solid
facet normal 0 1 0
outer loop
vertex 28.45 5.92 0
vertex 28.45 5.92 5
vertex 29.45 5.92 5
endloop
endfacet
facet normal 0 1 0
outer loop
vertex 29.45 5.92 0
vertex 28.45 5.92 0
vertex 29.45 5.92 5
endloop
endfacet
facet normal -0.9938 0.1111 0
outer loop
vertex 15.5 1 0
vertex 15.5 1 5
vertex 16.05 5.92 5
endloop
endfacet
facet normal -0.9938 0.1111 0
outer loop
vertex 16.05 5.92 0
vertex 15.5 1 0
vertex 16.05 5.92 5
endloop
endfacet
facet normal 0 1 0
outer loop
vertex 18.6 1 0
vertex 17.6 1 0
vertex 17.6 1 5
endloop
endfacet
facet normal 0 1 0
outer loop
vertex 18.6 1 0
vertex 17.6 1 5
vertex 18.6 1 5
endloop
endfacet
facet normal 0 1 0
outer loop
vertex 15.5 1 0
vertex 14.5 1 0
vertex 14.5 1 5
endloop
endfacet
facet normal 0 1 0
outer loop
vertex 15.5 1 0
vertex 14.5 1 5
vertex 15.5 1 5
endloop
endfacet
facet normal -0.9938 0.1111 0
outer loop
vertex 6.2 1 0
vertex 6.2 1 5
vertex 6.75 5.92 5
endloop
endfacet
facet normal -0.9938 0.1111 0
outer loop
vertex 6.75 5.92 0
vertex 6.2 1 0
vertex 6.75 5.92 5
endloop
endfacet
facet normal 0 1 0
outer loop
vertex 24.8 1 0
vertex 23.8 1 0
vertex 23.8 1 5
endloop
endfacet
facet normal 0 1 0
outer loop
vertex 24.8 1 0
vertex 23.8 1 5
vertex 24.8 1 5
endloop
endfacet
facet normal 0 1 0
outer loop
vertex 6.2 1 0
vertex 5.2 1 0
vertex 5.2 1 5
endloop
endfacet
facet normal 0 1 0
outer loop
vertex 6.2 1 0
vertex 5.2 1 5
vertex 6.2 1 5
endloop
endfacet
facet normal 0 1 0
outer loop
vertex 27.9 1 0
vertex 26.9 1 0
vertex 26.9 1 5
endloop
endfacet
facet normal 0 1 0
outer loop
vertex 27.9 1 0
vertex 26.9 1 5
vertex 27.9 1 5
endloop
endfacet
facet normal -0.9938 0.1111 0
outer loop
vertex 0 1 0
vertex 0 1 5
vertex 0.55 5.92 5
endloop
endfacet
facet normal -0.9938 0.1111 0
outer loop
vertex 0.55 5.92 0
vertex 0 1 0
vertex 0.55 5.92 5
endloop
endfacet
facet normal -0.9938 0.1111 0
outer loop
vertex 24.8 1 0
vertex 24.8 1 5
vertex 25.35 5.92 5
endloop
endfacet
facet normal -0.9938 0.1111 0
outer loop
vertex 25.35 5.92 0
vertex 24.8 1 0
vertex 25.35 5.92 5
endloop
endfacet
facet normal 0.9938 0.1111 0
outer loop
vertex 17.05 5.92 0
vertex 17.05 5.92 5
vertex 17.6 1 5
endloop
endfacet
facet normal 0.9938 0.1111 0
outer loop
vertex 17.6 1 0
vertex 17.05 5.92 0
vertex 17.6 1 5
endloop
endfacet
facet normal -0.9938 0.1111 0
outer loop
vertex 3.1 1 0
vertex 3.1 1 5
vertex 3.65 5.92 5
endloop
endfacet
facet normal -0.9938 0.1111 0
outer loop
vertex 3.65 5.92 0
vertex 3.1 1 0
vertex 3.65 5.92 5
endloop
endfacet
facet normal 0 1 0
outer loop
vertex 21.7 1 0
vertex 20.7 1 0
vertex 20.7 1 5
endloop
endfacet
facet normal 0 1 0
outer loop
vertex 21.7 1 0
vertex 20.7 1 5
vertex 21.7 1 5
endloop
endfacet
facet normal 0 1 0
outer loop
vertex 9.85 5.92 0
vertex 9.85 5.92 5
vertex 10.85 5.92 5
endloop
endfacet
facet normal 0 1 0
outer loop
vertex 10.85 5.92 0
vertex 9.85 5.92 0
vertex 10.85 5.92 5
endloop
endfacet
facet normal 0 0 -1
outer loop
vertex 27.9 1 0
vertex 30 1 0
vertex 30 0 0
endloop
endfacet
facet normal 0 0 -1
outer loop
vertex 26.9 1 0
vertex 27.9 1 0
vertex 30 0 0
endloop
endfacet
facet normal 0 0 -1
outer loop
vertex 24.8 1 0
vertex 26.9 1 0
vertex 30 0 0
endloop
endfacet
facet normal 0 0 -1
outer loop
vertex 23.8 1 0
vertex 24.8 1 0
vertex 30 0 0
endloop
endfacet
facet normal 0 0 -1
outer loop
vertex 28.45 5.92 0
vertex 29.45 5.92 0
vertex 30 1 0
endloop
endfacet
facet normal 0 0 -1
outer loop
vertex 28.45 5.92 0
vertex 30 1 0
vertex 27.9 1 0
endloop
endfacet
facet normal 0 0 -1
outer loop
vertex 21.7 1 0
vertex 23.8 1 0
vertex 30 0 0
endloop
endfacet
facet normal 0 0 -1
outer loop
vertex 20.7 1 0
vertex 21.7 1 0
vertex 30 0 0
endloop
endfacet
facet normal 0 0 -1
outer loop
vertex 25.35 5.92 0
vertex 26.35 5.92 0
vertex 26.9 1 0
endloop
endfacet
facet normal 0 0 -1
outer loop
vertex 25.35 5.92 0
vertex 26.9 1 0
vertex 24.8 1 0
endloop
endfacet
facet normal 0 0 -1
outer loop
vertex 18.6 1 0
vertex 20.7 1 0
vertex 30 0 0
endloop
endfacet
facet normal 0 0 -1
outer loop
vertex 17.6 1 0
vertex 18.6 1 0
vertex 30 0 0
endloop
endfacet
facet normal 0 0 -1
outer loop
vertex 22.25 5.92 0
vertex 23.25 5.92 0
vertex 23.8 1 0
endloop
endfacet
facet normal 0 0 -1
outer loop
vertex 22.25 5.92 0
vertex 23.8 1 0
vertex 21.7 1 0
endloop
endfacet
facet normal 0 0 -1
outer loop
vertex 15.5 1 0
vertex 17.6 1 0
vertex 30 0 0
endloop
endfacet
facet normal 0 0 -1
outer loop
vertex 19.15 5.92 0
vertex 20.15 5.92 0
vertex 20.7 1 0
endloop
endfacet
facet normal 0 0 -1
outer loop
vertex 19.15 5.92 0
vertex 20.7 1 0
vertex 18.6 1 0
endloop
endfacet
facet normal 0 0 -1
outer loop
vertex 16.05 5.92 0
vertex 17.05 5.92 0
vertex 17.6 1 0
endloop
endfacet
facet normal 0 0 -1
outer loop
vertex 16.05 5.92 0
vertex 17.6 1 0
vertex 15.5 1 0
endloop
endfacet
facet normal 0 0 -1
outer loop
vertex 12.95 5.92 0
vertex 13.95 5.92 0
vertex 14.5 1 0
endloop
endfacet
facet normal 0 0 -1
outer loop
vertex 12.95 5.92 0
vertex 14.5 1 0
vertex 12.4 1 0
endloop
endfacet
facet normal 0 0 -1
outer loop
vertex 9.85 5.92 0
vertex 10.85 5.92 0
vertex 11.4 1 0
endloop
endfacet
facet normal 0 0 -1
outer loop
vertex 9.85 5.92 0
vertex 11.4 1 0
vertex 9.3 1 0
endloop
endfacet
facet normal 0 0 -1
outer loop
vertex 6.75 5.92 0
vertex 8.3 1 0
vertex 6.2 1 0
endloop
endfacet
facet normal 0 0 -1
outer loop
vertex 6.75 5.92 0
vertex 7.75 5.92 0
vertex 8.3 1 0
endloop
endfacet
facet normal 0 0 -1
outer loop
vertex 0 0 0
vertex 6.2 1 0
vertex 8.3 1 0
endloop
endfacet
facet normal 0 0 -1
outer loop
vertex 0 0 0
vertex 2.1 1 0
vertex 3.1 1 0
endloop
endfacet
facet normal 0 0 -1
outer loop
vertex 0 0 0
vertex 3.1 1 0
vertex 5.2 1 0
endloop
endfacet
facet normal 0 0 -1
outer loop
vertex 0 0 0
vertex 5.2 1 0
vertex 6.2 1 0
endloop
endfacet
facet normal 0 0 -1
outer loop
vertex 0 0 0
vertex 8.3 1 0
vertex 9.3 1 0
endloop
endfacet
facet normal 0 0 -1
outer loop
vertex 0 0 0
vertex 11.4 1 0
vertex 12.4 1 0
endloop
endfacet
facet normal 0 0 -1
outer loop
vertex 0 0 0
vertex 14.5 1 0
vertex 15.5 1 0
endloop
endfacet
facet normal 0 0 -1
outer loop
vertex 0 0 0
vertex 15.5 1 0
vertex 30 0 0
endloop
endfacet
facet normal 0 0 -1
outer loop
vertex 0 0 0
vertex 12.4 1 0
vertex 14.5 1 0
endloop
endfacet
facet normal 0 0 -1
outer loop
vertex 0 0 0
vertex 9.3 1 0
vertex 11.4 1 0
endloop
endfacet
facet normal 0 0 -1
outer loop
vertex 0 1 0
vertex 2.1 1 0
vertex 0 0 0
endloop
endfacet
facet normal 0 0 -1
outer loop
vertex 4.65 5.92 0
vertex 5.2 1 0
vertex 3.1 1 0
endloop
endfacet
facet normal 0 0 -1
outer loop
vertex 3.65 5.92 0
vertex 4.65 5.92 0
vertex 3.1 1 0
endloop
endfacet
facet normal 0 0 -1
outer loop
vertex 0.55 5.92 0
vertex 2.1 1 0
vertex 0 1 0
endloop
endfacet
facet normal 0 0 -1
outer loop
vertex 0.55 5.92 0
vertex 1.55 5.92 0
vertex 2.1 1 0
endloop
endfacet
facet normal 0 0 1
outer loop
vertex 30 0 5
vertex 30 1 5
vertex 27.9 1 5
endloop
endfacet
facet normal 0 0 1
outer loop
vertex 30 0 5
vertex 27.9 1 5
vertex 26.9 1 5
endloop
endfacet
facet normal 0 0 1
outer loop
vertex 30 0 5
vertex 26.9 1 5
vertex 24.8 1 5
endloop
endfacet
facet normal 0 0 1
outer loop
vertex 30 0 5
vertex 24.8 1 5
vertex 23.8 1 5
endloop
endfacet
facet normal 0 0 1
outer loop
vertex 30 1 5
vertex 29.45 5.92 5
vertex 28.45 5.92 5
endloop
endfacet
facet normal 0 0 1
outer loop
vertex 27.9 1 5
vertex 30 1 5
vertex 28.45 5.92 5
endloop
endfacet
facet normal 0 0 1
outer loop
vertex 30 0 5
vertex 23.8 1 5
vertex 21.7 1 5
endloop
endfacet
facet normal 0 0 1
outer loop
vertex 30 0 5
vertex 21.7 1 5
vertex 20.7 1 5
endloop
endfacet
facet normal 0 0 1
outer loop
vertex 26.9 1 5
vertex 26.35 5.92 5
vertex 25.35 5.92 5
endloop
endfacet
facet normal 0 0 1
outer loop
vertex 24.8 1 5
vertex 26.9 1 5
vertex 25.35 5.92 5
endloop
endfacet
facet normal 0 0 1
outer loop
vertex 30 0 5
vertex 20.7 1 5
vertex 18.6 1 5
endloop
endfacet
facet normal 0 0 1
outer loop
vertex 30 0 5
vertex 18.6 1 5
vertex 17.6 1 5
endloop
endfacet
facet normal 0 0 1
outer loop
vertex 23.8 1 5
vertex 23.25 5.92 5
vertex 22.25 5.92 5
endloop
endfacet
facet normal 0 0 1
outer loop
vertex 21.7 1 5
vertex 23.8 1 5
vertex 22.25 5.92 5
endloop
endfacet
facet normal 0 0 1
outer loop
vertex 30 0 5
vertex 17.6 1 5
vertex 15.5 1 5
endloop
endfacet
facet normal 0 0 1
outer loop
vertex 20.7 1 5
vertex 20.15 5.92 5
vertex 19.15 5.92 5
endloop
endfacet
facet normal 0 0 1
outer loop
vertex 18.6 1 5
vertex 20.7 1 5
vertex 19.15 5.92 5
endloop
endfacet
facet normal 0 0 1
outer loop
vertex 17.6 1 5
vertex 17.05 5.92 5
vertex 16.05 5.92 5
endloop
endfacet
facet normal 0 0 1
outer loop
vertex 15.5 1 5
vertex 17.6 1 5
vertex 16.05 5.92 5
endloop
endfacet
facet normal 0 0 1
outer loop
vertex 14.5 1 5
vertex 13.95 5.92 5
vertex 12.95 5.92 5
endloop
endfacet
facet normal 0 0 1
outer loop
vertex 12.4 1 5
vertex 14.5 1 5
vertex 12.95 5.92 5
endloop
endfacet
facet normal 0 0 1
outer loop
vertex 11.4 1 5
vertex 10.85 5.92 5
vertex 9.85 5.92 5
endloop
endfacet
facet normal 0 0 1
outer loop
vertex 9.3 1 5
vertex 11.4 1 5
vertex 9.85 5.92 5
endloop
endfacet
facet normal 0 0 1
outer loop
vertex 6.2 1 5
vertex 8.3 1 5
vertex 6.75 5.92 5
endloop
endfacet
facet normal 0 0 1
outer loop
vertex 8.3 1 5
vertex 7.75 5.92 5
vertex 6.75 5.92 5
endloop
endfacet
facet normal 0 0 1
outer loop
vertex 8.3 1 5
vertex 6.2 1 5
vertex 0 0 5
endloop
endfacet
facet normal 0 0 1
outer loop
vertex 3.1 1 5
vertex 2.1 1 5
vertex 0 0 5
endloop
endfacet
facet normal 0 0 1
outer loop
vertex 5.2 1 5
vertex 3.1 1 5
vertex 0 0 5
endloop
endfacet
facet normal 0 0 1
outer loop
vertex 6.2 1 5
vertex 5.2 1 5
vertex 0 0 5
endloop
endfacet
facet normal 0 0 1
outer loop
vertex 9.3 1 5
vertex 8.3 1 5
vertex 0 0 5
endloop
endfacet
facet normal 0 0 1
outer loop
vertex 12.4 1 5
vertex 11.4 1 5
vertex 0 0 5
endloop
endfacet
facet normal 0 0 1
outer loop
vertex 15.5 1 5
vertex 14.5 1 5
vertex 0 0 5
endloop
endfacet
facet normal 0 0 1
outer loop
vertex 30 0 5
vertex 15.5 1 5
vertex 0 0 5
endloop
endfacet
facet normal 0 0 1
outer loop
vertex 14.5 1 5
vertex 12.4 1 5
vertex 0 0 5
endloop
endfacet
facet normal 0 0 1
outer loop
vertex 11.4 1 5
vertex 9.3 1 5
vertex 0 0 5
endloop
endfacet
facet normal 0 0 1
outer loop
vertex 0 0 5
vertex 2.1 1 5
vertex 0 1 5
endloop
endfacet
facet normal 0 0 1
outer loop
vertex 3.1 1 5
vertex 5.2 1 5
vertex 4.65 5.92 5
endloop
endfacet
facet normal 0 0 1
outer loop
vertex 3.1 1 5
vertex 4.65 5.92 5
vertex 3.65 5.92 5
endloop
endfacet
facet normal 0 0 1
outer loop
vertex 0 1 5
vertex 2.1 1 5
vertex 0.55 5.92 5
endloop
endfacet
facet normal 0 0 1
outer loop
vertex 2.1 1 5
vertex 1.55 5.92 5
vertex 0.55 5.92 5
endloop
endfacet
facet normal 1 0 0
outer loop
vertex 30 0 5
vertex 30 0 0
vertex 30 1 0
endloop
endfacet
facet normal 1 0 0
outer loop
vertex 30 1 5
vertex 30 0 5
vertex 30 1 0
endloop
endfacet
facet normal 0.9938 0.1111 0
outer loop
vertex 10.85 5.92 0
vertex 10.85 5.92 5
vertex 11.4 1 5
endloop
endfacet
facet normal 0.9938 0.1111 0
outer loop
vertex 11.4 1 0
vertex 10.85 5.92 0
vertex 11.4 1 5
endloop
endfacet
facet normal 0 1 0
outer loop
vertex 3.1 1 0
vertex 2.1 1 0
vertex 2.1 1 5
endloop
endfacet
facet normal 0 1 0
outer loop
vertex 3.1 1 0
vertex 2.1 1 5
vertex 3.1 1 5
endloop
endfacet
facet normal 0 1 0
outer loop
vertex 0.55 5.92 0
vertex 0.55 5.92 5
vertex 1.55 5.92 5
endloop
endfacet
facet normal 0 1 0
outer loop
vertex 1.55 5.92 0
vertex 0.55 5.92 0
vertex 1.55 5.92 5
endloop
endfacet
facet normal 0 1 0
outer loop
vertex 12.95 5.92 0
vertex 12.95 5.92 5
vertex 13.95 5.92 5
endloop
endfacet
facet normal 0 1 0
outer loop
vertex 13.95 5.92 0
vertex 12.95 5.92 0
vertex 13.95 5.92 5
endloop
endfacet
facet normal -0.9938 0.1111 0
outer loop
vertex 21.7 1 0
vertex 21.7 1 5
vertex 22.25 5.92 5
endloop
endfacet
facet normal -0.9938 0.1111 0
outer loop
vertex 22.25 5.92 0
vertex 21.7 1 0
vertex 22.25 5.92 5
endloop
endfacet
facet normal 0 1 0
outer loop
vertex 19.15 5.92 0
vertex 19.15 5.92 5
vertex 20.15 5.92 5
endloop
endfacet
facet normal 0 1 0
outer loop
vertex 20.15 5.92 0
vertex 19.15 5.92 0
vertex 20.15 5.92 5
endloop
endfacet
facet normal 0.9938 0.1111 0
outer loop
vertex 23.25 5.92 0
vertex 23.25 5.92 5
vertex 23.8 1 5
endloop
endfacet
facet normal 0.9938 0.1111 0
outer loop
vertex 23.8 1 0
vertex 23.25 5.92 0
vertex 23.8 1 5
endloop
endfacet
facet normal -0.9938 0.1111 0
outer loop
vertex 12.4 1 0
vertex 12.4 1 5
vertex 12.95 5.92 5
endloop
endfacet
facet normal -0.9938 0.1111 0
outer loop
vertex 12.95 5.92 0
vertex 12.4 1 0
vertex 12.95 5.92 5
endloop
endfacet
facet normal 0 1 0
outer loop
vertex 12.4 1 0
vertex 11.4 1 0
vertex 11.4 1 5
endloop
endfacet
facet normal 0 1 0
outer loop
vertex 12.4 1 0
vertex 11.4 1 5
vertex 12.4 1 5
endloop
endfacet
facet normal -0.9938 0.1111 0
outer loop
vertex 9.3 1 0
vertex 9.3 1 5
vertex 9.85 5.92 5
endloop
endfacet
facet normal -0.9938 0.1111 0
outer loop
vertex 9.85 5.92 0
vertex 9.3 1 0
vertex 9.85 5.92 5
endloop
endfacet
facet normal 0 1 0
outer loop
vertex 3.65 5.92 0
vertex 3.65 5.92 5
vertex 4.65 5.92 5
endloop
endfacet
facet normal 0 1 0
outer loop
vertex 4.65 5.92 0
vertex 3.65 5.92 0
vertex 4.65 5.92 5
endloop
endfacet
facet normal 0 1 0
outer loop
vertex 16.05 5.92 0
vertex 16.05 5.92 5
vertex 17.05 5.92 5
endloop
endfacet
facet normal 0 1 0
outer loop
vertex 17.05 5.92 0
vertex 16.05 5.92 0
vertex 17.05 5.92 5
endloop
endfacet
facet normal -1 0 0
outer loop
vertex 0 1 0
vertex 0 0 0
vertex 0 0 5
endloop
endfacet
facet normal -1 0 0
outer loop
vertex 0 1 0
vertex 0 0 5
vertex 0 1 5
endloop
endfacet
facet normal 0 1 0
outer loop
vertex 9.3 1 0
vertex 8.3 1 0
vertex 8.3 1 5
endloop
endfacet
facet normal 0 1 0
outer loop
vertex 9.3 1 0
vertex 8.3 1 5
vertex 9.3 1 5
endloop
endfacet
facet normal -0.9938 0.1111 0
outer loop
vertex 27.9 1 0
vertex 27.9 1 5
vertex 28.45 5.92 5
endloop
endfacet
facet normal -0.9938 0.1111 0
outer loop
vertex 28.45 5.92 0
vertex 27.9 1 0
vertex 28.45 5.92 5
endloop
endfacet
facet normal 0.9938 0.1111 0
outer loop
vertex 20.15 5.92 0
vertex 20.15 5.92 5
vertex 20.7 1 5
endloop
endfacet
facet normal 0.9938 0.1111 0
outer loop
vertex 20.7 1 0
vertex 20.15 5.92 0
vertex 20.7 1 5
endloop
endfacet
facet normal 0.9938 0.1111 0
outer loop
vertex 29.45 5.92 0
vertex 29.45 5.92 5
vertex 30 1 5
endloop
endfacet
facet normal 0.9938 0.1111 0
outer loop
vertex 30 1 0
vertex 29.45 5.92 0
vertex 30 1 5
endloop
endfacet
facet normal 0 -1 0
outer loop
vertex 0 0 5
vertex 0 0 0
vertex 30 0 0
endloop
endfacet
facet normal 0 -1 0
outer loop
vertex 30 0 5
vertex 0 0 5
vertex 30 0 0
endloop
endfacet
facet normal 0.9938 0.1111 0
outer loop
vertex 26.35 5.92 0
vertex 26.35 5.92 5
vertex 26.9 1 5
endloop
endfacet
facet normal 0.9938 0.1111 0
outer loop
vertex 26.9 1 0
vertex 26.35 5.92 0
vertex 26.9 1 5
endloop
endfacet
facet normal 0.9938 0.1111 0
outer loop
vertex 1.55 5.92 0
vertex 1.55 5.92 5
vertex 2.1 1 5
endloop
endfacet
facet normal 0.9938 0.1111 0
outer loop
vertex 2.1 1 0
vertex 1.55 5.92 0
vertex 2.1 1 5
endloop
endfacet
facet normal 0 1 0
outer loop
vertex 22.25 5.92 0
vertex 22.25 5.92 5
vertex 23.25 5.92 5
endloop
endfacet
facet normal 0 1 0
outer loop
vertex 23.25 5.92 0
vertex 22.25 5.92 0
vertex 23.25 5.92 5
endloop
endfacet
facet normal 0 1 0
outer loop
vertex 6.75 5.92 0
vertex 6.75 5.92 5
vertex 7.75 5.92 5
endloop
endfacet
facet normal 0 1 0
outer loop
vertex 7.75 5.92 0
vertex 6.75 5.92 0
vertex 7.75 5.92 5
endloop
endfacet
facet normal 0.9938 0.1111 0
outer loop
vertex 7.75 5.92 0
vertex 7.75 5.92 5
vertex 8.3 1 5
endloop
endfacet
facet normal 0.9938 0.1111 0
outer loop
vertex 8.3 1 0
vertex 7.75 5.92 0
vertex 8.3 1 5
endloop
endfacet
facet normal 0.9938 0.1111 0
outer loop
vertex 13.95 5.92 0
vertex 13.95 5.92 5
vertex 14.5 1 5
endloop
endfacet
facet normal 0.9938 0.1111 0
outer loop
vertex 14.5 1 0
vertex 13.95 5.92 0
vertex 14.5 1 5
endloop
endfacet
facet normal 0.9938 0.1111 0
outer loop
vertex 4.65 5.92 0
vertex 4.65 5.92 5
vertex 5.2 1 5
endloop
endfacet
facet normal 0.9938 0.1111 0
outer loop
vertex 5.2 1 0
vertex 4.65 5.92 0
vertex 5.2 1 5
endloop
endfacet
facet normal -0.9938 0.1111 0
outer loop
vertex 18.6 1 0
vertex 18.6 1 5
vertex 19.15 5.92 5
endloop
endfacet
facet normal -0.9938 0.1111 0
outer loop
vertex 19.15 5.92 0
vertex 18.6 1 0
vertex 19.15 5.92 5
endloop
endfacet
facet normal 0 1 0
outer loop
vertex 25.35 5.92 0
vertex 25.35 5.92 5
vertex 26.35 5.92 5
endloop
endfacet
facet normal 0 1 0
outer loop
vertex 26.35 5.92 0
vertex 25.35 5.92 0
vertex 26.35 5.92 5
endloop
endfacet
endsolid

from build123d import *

# Parameters (mm, degrees)
SKETCH3_W           = 30
SKETCH3_H           = 1
BOSS_EXTRUDE1_DEPTH = 5
BOSS_EXTRUDE2_DEPTH = 5
LPATTERN1_COUNT     = 10
LPATTERN1_PITCH     = 3.1


with BuildPart() as part:
    # Sketch3 → Boss-Extrude1 (new body)
    with BuildSketch(Plane.XY):
        with Locations((15, 0.5)):
            Rectangle(SKETCH3_W, SKETCH3_H)
    extrude(amount=BOSS_EXTRUDE1_DEPTH)

    # Sketch5 → Boss-Extrude2 (add)
    with BuildSketch(Plane.XY.offset(5)):
        Polygon((0, 1), (0.55, 5.92), (1.55, 5.92), (2.1, 1), align=None)
    boss_extrude2 = extrude(amount=-BOSS_EXTRUDE2_DEPTH)

    # LPattern1: Boss-Extrude2 ×10
    with Locations(*[(i * LPATTERN1_PITCH, 0, 0) for i in range(1, LPATTERN1_COUNT)]):
        add(boss_extrude2)


solid = part.part
